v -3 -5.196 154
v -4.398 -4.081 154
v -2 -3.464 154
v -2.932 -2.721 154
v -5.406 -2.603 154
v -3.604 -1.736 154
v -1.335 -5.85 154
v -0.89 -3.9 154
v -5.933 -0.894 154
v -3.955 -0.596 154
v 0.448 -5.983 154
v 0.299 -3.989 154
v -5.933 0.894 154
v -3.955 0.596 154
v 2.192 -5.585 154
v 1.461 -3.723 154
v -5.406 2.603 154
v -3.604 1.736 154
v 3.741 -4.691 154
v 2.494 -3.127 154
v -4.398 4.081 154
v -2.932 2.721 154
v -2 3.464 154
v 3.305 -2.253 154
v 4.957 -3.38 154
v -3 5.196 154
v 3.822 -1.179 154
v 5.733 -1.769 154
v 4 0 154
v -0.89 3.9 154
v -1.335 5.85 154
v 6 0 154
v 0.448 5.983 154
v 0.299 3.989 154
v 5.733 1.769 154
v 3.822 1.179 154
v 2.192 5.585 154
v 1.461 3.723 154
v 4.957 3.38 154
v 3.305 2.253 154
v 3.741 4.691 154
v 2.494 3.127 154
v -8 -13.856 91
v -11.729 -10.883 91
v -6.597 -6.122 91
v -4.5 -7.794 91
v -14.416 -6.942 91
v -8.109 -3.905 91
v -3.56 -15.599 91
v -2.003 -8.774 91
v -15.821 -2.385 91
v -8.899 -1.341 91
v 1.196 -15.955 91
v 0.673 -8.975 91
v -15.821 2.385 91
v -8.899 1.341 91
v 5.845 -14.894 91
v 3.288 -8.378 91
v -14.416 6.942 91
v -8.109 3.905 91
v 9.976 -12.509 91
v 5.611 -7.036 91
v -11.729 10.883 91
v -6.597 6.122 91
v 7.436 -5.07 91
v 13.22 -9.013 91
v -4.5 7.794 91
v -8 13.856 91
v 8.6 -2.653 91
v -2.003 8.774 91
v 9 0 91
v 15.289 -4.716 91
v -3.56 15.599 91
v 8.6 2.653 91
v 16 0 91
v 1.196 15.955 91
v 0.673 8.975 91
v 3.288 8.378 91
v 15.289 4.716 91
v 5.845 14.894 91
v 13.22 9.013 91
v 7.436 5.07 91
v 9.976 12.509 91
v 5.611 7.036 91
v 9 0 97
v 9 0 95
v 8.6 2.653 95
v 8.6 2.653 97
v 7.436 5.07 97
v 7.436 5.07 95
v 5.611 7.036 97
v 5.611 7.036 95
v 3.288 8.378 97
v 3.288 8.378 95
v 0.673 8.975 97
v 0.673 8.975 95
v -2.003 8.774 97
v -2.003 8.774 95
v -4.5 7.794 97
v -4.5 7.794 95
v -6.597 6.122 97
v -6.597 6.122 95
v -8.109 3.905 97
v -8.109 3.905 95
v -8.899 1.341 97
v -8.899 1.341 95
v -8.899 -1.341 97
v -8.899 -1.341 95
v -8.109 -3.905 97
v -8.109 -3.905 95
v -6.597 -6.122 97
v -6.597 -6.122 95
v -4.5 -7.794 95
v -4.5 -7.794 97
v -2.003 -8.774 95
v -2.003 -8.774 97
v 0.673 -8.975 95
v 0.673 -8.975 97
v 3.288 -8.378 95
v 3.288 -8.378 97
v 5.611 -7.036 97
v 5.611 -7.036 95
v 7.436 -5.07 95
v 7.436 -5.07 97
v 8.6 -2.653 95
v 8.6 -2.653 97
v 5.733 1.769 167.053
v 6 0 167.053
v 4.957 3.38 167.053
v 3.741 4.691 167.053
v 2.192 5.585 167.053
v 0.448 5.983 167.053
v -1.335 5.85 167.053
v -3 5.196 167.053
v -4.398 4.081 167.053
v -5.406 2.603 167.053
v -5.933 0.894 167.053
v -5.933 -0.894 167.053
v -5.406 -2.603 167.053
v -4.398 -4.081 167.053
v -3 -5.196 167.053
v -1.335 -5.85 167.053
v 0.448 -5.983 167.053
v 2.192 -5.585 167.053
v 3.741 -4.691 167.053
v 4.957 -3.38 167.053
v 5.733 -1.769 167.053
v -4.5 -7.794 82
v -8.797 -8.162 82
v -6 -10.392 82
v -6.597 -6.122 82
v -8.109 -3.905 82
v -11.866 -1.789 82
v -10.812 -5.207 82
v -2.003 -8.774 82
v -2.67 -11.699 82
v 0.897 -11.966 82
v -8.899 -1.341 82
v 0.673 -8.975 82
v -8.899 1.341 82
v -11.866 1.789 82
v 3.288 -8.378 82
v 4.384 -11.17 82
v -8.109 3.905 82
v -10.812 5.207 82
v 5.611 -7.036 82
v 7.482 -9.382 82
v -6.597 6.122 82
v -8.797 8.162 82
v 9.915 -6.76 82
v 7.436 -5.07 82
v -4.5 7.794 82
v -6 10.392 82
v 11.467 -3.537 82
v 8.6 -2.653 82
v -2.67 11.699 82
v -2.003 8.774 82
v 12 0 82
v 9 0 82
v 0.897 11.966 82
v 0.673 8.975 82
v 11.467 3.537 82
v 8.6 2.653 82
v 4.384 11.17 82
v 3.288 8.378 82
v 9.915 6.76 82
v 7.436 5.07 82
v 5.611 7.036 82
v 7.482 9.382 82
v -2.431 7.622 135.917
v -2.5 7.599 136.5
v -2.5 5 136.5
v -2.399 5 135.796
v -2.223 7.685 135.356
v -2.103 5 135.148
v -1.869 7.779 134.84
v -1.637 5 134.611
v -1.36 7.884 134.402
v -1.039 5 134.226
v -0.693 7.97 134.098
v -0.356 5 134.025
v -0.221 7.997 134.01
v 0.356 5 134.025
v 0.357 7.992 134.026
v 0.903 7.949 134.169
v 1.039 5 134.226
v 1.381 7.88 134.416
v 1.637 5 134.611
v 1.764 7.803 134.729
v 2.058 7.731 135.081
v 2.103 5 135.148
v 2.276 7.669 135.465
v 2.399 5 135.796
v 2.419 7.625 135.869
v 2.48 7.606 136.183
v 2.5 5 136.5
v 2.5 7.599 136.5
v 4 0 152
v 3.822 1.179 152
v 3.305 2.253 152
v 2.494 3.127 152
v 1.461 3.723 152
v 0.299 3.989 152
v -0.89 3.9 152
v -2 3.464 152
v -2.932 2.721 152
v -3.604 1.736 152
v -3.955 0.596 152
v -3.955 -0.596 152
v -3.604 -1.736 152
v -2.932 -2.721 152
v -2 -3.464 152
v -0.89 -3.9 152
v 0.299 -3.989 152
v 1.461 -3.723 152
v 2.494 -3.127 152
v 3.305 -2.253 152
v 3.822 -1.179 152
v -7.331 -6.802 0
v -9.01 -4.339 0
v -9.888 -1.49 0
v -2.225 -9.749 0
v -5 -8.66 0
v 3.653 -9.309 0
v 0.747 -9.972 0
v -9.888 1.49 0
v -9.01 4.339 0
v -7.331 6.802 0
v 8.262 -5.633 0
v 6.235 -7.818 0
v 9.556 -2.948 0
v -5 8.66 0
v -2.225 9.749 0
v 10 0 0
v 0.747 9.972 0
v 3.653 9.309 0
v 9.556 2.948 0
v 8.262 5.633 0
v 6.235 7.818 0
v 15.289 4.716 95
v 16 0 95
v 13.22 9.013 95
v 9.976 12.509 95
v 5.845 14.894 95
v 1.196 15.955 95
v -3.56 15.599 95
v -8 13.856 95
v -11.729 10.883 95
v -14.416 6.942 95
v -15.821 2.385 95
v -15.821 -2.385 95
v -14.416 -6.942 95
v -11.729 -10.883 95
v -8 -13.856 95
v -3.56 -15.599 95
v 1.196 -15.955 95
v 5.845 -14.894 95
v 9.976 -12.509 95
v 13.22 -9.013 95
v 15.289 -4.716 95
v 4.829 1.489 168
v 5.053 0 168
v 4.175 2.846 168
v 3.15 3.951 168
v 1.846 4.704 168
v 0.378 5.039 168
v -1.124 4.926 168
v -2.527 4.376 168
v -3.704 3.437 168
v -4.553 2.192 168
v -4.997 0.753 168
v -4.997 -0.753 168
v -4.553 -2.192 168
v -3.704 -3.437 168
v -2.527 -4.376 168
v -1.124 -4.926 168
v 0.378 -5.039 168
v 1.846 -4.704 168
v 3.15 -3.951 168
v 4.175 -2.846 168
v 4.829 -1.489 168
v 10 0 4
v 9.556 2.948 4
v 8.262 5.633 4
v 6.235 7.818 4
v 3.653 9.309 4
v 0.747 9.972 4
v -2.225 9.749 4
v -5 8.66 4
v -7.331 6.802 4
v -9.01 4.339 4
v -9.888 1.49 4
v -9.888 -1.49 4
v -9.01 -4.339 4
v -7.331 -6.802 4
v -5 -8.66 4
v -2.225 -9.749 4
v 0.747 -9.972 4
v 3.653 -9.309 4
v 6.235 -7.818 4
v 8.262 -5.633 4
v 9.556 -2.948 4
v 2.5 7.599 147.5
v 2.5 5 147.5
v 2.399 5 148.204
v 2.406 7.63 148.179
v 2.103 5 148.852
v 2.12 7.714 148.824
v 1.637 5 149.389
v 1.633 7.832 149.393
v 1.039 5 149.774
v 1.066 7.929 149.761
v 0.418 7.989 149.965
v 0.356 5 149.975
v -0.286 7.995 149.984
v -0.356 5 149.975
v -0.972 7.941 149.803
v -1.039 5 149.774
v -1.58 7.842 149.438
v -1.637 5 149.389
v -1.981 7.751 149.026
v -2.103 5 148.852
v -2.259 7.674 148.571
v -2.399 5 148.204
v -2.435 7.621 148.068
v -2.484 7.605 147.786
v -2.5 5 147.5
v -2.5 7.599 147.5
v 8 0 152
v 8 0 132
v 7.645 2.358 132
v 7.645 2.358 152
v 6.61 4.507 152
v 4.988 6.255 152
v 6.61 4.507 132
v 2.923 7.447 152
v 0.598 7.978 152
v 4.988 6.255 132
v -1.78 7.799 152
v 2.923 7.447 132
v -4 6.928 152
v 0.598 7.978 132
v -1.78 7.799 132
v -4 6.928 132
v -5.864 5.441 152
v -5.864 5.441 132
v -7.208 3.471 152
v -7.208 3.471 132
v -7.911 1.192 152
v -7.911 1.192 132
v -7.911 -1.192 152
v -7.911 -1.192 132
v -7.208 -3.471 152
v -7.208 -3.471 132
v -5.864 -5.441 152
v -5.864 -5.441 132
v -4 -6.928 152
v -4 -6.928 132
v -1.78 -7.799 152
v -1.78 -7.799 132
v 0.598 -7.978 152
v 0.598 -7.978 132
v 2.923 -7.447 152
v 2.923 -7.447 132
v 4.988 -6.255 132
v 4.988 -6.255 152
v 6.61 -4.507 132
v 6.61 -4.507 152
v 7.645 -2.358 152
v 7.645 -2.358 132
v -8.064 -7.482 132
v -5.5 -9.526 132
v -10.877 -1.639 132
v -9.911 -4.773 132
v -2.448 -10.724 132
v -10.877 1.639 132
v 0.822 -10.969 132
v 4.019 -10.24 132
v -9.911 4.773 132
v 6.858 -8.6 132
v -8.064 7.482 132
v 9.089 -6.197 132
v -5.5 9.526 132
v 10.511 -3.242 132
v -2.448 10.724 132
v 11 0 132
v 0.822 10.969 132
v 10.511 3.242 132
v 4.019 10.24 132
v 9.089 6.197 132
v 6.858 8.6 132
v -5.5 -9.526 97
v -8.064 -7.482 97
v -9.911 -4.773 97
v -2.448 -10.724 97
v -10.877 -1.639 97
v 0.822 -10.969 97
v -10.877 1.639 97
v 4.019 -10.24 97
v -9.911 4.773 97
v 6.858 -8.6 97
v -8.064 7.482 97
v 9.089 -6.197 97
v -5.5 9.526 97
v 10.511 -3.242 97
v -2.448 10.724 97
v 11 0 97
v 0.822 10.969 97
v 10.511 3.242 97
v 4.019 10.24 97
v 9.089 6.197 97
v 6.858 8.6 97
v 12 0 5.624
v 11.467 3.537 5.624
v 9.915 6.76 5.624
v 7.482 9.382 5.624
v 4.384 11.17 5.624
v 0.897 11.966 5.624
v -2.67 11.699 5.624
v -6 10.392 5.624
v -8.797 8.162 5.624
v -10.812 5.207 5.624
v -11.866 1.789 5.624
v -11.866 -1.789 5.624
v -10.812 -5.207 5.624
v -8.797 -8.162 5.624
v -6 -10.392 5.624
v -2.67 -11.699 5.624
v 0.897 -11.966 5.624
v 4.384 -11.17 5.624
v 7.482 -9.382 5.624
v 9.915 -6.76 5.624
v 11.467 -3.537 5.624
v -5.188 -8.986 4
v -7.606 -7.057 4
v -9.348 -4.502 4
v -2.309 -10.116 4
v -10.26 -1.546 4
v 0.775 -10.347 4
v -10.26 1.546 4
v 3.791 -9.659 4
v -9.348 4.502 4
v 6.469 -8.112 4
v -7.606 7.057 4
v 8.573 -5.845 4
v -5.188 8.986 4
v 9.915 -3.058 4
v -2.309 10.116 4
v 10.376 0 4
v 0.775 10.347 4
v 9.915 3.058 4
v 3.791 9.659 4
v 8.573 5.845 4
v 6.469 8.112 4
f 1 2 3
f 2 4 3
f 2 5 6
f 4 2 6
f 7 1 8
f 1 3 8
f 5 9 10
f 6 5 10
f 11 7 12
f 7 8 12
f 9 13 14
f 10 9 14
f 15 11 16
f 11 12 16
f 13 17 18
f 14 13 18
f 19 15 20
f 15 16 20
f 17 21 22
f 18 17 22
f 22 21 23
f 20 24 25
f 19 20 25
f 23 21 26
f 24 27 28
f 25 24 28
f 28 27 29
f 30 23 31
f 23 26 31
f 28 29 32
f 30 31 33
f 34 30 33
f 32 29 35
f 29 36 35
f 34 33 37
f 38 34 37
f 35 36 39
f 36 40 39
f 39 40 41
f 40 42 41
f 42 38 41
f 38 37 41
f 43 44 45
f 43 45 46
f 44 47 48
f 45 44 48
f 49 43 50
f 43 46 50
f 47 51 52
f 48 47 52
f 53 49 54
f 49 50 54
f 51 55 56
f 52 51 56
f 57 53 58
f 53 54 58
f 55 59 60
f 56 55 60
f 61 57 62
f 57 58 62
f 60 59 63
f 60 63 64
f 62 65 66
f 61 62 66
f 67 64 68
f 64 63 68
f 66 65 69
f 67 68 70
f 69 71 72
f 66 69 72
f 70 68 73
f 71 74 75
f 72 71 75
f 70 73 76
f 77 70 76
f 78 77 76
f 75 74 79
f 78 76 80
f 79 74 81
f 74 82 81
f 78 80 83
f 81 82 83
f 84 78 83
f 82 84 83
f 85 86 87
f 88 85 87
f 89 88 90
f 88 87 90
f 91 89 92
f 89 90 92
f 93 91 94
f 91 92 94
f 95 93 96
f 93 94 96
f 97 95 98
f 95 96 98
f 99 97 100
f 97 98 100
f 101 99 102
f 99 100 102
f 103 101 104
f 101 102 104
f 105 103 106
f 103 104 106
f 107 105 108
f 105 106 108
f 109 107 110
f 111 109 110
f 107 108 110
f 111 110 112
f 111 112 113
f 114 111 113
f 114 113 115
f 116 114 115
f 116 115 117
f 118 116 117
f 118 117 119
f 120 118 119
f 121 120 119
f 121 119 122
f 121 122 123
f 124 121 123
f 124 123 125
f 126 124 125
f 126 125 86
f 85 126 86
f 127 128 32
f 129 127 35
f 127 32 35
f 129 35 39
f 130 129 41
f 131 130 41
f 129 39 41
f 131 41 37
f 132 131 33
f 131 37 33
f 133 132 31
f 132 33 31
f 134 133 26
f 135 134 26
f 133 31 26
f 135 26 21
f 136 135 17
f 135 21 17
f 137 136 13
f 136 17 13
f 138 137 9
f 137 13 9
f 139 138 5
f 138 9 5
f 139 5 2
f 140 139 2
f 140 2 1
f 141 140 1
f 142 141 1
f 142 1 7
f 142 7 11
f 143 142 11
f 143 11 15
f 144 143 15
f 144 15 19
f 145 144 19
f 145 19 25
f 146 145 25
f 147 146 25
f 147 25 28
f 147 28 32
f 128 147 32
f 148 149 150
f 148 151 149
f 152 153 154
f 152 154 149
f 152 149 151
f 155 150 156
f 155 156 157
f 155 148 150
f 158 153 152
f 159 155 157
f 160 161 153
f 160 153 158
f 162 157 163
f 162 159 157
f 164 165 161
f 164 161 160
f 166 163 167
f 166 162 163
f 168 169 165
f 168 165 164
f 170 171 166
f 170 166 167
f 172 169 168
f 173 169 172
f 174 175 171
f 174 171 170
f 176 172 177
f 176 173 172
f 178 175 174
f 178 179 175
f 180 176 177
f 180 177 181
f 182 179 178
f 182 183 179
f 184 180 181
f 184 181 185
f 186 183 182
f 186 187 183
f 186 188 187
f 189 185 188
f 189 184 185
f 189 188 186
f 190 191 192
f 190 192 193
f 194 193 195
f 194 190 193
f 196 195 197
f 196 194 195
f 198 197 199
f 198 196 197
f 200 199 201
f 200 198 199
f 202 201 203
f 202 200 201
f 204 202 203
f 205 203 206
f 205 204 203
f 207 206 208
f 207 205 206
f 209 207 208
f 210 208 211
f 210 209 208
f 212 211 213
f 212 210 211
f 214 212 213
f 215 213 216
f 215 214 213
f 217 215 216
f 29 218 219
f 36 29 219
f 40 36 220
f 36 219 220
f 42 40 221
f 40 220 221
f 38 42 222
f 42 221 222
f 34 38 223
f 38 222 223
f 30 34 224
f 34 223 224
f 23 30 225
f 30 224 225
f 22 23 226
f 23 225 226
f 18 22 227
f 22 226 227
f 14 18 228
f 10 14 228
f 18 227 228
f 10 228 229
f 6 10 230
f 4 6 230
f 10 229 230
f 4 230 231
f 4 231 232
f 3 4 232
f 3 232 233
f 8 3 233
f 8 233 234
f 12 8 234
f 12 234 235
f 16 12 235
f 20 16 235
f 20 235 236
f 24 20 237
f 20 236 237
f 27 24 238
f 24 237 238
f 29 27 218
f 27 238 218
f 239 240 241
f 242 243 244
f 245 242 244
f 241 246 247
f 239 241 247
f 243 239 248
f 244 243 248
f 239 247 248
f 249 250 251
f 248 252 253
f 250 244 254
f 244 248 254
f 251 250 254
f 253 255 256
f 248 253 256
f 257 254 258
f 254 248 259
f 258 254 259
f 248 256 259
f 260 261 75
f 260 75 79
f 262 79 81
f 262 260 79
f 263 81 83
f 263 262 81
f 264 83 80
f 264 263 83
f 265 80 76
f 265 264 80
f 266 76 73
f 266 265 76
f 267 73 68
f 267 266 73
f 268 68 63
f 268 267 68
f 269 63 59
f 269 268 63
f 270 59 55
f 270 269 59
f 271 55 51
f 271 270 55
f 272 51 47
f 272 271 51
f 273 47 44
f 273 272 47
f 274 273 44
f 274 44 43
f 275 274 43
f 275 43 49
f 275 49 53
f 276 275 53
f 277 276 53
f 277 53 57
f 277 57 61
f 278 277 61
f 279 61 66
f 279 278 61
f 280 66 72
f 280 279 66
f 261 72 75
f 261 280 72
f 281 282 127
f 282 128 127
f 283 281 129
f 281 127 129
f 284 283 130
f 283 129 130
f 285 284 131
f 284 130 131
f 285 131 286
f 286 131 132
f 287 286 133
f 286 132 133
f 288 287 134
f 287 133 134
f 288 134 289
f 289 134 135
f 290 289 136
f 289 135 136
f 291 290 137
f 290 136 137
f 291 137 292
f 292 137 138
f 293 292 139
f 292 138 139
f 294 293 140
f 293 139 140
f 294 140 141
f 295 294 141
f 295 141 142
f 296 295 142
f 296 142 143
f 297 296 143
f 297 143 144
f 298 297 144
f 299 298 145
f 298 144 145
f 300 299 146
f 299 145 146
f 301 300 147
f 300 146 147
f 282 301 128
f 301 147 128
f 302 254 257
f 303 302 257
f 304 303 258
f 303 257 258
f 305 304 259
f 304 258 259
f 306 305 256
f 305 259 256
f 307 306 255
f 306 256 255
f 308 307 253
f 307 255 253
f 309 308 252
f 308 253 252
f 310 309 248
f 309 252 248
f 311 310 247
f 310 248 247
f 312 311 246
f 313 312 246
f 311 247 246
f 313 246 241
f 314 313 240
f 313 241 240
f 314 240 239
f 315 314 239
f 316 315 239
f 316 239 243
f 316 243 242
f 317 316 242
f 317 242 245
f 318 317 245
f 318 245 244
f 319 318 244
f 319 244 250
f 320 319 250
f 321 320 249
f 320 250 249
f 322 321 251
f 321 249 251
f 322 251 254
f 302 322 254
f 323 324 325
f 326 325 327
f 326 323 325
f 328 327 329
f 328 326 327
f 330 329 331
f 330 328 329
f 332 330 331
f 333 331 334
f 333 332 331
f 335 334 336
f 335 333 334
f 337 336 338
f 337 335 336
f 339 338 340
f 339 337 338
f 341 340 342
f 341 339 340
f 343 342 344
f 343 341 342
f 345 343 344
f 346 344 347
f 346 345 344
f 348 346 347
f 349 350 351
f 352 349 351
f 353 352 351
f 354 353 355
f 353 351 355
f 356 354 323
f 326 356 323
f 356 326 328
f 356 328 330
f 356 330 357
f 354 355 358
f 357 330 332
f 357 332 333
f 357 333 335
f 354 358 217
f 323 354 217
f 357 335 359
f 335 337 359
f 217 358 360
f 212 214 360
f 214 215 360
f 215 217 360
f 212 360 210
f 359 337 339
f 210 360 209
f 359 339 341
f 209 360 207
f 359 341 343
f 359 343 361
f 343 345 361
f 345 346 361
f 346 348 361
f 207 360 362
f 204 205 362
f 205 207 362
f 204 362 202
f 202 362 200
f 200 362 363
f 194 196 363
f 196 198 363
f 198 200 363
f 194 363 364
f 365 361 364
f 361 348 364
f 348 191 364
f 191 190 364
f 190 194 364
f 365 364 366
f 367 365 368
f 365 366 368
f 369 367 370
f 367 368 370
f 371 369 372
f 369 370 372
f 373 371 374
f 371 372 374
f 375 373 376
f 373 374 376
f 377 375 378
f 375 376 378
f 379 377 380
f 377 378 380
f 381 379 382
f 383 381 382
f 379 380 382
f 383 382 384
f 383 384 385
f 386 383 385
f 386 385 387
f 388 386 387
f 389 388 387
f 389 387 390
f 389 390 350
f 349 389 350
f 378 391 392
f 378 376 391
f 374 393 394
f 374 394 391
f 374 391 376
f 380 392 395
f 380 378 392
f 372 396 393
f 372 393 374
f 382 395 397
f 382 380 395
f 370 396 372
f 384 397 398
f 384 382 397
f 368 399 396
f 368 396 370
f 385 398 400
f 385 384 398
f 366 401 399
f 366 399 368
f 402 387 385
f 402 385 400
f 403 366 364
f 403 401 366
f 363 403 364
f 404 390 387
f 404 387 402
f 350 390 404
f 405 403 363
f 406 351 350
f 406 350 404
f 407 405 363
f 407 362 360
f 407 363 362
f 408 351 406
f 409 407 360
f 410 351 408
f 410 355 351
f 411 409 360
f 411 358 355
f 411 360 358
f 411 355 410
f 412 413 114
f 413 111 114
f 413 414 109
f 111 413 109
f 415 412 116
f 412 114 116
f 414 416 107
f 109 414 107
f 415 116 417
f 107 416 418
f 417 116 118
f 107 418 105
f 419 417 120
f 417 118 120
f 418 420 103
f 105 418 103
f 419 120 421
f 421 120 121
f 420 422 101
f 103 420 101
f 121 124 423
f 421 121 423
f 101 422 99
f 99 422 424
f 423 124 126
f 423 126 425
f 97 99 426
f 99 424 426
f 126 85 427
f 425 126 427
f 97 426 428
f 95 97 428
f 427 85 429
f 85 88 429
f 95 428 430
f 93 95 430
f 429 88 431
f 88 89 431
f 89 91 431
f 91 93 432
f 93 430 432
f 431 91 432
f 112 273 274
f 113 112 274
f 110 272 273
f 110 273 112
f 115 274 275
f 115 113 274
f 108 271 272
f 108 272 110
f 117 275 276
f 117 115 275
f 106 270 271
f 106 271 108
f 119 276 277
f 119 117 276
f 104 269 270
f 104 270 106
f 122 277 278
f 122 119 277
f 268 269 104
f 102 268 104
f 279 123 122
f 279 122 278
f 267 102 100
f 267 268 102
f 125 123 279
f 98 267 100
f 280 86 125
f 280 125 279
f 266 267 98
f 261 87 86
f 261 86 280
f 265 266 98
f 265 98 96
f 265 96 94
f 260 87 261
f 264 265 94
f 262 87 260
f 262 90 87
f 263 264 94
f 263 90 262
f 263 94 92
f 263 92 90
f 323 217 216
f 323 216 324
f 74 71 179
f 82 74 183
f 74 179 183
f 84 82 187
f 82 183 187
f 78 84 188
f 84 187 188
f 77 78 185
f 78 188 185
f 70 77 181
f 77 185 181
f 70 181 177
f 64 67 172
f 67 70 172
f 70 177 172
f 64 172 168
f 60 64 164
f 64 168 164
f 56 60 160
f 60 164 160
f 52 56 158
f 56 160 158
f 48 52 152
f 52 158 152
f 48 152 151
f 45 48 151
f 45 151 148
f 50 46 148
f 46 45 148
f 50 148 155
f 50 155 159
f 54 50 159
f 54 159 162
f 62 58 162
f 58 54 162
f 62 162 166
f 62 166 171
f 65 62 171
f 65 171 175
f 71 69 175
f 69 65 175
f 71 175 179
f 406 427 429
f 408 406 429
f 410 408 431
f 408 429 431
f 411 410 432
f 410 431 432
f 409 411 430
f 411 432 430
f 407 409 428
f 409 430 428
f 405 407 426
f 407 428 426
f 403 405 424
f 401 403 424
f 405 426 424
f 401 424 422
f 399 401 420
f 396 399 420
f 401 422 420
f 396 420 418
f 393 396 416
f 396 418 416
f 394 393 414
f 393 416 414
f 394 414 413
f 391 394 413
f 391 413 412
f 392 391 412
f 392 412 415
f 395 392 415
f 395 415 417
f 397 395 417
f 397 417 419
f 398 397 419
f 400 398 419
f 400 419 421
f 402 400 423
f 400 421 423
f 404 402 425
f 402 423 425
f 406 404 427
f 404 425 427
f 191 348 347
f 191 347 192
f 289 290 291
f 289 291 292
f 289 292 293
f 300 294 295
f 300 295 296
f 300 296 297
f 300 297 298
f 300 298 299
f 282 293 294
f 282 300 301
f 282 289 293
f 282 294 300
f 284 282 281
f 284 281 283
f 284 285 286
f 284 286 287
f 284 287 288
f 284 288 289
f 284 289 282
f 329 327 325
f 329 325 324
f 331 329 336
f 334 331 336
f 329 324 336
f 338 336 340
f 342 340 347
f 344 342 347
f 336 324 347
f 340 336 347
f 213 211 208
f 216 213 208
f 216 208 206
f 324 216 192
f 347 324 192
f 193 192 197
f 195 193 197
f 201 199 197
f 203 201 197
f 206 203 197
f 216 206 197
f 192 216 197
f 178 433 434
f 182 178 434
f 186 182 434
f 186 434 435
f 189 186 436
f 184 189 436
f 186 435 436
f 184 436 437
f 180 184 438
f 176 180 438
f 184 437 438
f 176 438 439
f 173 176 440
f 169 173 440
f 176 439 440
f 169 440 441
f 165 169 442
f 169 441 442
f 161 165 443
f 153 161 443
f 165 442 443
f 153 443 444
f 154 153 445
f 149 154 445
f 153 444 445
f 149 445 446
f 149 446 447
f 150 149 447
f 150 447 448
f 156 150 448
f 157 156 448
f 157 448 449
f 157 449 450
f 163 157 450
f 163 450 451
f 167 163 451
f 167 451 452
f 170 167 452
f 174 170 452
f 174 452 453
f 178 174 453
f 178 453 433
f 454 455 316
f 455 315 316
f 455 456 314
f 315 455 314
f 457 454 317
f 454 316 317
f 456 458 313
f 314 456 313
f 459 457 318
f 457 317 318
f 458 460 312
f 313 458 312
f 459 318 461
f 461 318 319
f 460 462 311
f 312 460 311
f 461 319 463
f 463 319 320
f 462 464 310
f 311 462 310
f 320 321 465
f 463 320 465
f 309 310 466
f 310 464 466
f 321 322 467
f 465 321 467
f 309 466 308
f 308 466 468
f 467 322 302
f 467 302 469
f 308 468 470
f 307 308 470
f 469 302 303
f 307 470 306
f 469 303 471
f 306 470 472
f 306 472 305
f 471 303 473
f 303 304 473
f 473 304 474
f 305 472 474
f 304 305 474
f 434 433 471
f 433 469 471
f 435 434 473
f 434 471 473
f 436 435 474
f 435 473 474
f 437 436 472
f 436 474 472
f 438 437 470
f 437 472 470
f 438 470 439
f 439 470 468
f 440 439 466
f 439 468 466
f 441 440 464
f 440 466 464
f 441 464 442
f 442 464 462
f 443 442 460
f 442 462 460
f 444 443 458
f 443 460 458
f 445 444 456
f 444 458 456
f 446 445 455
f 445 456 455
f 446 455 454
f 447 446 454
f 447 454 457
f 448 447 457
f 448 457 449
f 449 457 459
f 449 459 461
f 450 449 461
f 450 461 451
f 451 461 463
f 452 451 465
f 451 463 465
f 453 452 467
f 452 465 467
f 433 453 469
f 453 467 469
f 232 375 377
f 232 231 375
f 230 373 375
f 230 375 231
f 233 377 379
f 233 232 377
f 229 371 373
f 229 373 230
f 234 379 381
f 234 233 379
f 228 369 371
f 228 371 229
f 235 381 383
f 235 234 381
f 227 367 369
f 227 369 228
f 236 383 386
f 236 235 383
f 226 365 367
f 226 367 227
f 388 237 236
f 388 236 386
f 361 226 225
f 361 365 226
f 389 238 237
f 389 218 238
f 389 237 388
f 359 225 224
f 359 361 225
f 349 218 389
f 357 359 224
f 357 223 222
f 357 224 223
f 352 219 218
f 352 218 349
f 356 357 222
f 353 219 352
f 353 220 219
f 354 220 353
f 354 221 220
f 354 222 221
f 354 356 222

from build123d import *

# Parameters (mm, degrees)
SKETCH_1_R          = 10
EXTRUDE_1_DEPTH     = 4
SKETCH_2_R          = 12
EXTRUDE_2_DEPTH     = 78
SKETCH_4_R          = 9
EXTRUDE_3_DEPTH     = 15
EXTRUDE_START       = -2
SKETCH_5_R          = 16
EXTRUDE_4_DEPTH     = 4
SKETCH_6_R          = 11
EXTRUDE_5_DEPTH     = 35
SKETCH_7_R          = 8
EXTRUDE_6_DEPTH     = 20
SKETCH_8_R          = 6
EXTRUDE_7_DEPTH     = 16
CUT_EXTRUDE_START   = 20
SKETCH_9_R          = 6
SKETCH_9_R_2        = 4
CUT_EXTRUDE_1_DEPTH = 2
CUT_EXTRUDE_START_2 = 8
CUT_EXTRUDE_2_DEPTH = 3


# Read off the part's stored shape, not the designer's step: M24 机械螺纹 螺柱1, M12 机械螺纹 螺柱1
with BuildPart() as part:
    # 草图1 → 凸台-拉伸1 (new body)
    with BuildSketch(Plane.XY):
        Circle(SKETCH_1_R)
    extrude(amount=EXTRUDE_1_DEPTH)

    # 草图2 → 凸台-拉伸2 (add)
    with BuildSketch(Plane.XY.offset(4)):
        Circle(SKETCH_2_R)
    extrude(amount=EXTRUDE_2_DEPTH)

    # M24 机械螺纹 螺柱1 outline → M24 机械螺纹 螺柱1 (revolve, cut)
    with BuildSketch(Plane.XZ):
        Polygon((12, 5.624), (10.376, 4), (12, 4), align=None)
    revolve(axis=Axis((0, 0, 0), (0, 0, 1)), mode=Mode.SUBTRACT)

    # 草图4 → 凸台-拉伸3 (add)
    with BuildSketch(Plane.XY.offset(82)):
        Circle(SKETCH_4_R)
    extrude(amount=EXTRUDE_3_DEPTH)

    # 草图5 → 凸台-拉伸4 (add)
    with BuildSketch(Plane.XY.offset(97).offset(EXTRUDE_START)):
        Circle(SKETCH_5_R)
    extrude(amount=-EXTRUDE_4_DEPTH)

    # 草图6 → 凸台-拉伸5 (add)
    with BuildSketch(Plane.XY.offset(97)):
        Circle(SKETCH_6_R)
    extrude(amount=EXTRUDE_5_DEPTH)

    # 草图7 → 凸台-拉伸6 (add)
    with BuildSketch(Plane.XY.offset(132)):
        Circle(SKETCH_7_R)
    extrude(amount=EXTRUDE_6_DEPTH)

    # 草图8 → 凸台-拉伸7 (add)
    with BuildSketch(Plane.XY.offset(152)):
        Circle(SKETCH_8_R)
    extrude(amount=EXTRUDE_7_DEPTH)

    # 草图9 → 切除-拉伸1 (cut)
    with BuildSketch(Plane.XY.offset(132).offset(CUT_EXTRUDE_START)):
        Circle(SKETCH_9_R)
        Circle(SKETCH_9_R_2, mode=Mode.SUBTRACT)
    extrude(amount=CUT_EXTRUDE_1_DEPTH, mode=Mode.SUBTRACT)

    # M12 机械螺纹 螺柱1 outline → M12 机械螺纹 螺柱1 (revolve, cut)
    with BuildSketch(Plane.XZ):
        Polygon((6, 168), (5.053, 168), (6, 167.053), align=None)
    revolve(axis=Axis((0, 0, 0), (0, 0, 1)), mode=Mode.SUBTRACT)

    # 草图11 → 切除-拉伸2 (cut)
    with BuildSketch(Plane(origin=(0, 0, 0), x_dir=(1, 0, 0), z_dir=(0, 1, 0)).offset(CUT_EXTRUDE_START_2)):
        with BuildLine():
            Line((-2.5, -147.5), (-2.5, -136.5))
            ThreePointArc((-2.5, -136.5), (0, -134), (2.5, -136.5))
            Line((2.5, -136.5), (2.5, -147.5))
            ThreePointArc((2.5, -147.5), (0, -150), (-2.5, -147.5))
        make_face()
    extrude(amount=-CUT_EXTRUDE_2_DEPTH, mode=Mode.SUBTRACT)


solid = part.part
